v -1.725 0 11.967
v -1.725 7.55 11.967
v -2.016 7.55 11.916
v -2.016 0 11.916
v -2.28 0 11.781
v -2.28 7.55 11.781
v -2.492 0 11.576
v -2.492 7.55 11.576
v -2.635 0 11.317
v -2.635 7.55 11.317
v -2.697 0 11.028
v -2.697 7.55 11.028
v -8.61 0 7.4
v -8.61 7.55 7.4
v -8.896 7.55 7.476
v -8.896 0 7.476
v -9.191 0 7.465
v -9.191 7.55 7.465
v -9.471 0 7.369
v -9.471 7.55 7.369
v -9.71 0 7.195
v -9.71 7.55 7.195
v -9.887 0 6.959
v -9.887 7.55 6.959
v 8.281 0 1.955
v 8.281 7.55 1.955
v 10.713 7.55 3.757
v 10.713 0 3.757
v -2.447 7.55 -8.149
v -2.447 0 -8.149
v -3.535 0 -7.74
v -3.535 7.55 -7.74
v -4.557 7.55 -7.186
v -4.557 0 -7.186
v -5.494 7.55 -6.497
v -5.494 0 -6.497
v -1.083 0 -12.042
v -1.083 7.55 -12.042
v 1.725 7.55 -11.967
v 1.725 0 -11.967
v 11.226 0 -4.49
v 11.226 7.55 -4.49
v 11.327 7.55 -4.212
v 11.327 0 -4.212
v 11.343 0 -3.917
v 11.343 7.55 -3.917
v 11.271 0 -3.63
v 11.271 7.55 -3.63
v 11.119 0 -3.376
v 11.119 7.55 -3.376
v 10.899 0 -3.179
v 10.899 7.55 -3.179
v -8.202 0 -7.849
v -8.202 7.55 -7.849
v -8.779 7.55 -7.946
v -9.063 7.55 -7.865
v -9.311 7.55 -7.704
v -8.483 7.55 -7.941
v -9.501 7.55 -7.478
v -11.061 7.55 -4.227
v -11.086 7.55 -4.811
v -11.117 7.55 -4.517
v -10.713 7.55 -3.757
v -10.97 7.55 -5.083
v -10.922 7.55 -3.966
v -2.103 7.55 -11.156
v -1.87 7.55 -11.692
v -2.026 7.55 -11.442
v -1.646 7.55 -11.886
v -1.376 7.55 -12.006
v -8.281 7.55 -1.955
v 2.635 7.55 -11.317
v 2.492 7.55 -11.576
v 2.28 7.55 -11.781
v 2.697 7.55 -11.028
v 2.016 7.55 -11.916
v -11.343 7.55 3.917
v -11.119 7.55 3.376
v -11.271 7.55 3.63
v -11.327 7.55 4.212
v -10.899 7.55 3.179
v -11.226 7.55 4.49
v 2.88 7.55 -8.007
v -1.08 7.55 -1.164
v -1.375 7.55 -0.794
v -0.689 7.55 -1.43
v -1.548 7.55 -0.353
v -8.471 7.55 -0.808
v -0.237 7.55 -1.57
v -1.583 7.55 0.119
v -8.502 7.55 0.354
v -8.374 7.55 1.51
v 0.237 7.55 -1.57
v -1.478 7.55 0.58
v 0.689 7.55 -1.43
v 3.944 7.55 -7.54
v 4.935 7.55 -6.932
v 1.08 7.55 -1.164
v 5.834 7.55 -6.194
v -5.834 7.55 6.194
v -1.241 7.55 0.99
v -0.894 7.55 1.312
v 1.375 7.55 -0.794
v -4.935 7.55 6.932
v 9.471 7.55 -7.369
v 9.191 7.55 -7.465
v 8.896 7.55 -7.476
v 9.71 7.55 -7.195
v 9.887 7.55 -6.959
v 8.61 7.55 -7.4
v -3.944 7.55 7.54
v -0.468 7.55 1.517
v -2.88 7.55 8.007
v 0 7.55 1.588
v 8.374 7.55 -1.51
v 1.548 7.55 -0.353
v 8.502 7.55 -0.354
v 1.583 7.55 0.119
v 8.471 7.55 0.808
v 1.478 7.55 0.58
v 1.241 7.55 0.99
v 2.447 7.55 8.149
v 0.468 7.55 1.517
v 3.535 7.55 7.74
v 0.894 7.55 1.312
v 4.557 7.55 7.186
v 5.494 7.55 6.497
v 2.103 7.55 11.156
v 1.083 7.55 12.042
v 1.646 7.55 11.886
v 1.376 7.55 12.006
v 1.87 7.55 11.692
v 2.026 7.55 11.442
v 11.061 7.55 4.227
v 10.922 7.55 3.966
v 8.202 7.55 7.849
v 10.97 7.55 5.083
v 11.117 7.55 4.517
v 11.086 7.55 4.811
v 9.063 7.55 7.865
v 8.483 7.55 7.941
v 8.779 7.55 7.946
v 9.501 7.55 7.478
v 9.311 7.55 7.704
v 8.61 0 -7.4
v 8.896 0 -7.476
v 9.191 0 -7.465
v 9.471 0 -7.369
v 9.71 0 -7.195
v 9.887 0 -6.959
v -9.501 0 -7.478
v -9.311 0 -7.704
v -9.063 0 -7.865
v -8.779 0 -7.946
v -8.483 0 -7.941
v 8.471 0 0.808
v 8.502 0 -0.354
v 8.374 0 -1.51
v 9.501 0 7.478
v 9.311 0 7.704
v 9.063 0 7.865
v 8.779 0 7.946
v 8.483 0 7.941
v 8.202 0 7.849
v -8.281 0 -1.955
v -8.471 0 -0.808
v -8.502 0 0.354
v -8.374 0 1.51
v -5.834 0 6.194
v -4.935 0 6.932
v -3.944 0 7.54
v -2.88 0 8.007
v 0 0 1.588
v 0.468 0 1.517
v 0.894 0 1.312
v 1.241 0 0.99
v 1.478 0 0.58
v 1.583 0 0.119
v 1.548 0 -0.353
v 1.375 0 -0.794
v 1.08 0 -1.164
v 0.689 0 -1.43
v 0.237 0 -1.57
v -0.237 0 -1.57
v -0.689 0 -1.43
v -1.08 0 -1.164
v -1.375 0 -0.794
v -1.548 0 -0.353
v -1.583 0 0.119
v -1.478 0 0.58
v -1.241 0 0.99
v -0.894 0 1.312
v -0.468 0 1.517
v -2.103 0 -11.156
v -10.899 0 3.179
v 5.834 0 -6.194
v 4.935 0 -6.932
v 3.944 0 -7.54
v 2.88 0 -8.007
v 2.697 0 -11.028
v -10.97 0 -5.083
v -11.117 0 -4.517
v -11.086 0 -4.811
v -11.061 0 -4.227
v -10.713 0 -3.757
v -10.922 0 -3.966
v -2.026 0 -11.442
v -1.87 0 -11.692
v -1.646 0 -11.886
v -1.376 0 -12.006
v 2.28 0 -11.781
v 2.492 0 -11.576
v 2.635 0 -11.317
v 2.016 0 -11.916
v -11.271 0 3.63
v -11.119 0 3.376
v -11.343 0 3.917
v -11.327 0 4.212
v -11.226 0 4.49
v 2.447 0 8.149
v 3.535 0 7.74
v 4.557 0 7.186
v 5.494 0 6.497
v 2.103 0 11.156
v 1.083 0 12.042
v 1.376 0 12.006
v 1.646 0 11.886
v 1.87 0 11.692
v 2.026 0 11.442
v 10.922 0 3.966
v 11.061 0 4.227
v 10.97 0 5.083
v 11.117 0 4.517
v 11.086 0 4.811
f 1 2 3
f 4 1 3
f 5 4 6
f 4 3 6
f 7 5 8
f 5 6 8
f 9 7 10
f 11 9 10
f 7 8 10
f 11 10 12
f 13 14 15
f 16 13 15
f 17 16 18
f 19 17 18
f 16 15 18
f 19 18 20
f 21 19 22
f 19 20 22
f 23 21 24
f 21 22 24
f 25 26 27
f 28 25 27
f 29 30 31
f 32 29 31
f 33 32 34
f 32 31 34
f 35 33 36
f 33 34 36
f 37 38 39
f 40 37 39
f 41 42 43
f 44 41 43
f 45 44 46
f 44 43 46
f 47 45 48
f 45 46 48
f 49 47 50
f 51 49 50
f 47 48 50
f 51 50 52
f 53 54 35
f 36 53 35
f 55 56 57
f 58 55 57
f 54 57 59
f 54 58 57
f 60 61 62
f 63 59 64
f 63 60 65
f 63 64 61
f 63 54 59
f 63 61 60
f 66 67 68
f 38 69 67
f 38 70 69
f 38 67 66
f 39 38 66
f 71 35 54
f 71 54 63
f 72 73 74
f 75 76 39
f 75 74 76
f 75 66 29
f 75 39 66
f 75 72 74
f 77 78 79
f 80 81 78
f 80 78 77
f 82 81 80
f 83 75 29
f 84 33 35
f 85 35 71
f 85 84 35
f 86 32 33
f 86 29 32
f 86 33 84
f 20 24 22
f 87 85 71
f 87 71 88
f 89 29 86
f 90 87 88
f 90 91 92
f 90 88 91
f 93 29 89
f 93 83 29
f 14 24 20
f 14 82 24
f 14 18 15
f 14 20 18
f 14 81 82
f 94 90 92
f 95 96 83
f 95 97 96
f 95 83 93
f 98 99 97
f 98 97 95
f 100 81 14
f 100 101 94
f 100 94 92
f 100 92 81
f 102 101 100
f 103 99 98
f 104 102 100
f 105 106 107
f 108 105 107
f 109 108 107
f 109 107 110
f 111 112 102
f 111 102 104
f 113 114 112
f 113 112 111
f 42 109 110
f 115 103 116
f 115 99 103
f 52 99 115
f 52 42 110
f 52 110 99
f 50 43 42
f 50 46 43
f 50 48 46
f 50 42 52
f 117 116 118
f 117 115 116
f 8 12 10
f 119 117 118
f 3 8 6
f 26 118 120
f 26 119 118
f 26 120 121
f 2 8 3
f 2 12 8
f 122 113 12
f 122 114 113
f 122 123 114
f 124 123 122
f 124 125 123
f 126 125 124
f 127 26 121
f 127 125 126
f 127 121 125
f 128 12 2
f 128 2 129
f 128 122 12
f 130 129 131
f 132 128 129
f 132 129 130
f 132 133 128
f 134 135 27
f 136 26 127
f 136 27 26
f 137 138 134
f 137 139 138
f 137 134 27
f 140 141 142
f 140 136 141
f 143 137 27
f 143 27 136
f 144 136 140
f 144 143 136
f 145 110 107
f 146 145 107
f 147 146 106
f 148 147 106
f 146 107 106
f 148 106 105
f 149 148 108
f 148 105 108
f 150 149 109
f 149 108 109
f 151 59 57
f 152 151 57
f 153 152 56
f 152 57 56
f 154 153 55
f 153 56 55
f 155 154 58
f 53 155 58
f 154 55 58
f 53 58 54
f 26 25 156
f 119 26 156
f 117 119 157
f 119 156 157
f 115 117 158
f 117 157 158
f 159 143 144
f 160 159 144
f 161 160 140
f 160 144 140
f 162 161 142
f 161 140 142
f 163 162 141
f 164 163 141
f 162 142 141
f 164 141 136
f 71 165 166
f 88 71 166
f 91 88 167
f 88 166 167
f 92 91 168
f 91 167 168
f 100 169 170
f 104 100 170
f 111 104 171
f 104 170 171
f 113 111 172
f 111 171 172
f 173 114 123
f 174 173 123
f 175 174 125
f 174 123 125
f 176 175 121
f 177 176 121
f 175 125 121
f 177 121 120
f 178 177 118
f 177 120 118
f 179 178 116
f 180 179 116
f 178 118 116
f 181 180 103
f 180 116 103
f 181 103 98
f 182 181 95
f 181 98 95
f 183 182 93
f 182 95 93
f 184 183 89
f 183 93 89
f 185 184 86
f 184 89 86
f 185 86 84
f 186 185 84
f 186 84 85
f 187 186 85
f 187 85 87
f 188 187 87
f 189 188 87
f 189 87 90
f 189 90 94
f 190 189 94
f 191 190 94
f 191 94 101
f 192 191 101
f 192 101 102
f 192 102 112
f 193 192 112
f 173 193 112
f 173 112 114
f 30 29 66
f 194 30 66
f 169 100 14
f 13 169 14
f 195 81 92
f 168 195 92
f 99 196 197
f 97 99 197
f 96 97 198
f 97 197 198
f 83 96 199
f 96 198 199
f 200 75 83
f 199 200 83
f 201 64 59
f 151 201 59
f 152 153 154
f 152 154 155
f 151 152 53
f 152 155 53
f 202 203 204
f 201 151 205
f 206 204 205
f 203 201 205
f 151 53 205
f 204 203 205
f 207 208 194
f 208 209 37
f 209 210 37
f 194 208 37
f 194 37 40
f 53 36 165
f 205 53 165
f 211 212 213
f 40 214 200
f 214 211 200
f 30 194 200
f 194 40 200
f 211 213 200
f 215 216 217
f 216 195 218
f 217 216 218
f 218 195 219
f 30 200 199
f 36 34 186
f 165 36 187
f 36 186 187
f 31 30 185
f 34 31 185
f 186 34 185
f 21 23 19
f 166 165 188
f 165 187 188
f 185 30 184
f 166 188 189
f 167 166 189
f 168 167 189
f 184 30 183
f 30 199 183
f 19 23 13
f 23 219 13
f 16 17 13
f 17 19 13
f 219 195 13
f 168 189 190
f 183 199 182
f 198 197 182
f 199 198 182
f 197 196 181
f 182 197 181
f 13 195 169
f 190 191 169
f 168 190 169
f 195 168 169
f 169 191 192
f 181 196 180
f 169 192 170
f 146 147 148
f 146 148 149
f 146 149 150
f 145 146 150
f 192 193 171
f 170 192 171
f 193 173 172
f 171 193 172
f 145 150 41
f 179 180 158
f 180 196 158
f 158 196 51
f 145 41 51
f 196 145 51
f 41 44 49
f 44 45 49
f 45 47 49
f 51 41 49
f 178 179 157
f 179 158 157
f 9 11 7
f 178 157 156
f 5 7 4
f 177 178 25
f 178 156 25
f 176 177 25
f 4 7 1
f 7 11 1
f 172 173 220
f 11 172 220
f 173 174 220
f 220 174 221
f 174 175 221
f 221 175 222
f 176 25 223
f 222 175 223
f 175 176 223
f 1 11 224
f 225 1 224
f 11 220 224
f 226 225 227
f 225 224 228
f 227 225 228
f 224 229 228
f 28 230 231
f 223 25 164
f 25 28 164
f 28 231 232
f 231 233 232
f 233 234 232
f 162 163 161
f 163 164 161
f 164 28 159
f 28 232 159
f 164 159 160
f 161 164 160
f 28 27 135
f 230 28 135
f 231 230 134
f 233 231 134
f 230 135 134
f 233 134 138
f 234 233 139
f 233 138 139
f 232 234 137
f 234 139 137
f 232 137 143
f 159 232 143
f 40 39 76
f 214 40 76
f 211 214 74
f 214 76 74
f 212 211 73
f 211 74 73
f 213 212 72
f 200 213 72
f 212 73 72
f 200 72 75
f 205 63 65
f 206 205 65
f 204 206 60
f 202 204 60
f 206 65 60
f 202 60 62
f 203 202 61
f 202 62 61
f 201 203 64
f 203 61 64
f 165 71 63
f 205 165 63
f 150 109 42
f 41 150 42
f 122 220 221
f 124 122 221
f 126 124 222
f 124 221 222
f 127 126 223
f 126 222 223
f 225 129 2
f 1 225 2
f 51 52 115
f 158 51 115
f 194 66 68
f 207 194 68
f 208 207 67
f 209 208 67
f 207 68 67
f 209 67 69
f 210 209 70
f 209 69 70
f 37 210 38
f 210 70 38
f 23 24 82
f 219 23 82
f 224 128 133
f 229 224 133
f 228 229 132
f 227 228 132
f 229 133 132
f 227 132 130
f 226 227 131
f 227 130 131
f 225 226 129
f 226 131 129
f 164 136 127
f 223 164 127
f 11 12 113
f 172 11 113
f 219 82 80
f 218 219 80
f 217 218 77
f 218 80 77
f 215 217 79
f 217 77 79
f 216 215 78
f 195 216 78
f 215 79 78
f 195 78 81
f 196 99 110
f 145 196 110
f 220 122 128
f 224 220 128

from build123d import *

# Parameters (mm, degrees)
SKETCH1_R           = 8.509
BOSS_EXTRUDE1_DEPTH = 7.55
SKETCH2_R           = 1.5875
CUT_EXTRUDE1_DEPTH  = 15.205937561
BOSS_EXTRUDE2_DEPTH = 7.55
CIRPATTERN1_COUNT   = 6


with BuildPart() as part:
    # Sketch1 → Boss-Extrude1 (new body)
    with BuildSketch(Plane(origin=(0, 0, 0), x_dir=(1, 0, 0), z_dir=(0, 1, 0))):
        with Locations(Location((0, 0, 0), (0, 0, 270))):
            Circle(SKETCH1_R)
    extrude(amount=BOSS_EXTRUDE1_DEPTH)

    # Sketch2 → Cut-Extrude1 (cut, through all)
    with BuildSketch(Plane(origin=(0, 7.55, 0), x_dir=(1, 0, 0), z_dir=(0, 1, 0))):
        with Locations(Location((0, 0, 0), (0, 0, 270))):
            Circle(SKETCH2_R)
    extrude(amount=-CUT_EXTRUDE1_DEPTH, mode=Mode.SUBTRACT)

    # Sketch3 → Boss-Extrude2 (add, through all)
    with BuildSketch(Plane(origin=(0, 7.55, 0), x_dir=(1, 0, 0), z_dir=(0, 1, 0))):
        with BuildLine():
            Line((-1.082882935, 12.042261501), (1.725110007, 11.967150578))
            ThreePointArc((1.725110007, 11.967150578), (2.393433601, 11.686456973), (2.69653959, 11.027995064))
            Line((2.69653959, 11.027995064), (2.879609723, 8.006930051))
            ThreePointArc((2.879609723, 8.006930051), (0.227525612, 8.505957506), (-2.447443894, 8.149423255))
            Line((-2.447443894, 8.149423255), (-2.103130346, 11.156381297))
            ThreePointArc((-2.103130346, 11.156381297), (-1.765256626, 11.797697659), (-1.082882935, 12.042261501))
        make_face()
    boss_extrude2 = extrude(amount=-BOSS_EXTRUDE2_DEPTH)

    # CirPattern1: Boss-Extrude2 ×6 about axis
    cirpattern1_axis = Axis((0, 0, 0), (0, 1, 0))
    for i in range(1, CIRPATTERN1_COUNT):
        add(boss_extrude2.rotate(cirpattern1_axis, i * 360 / CIRPATTERN1_COUNT))


solid = part.part
